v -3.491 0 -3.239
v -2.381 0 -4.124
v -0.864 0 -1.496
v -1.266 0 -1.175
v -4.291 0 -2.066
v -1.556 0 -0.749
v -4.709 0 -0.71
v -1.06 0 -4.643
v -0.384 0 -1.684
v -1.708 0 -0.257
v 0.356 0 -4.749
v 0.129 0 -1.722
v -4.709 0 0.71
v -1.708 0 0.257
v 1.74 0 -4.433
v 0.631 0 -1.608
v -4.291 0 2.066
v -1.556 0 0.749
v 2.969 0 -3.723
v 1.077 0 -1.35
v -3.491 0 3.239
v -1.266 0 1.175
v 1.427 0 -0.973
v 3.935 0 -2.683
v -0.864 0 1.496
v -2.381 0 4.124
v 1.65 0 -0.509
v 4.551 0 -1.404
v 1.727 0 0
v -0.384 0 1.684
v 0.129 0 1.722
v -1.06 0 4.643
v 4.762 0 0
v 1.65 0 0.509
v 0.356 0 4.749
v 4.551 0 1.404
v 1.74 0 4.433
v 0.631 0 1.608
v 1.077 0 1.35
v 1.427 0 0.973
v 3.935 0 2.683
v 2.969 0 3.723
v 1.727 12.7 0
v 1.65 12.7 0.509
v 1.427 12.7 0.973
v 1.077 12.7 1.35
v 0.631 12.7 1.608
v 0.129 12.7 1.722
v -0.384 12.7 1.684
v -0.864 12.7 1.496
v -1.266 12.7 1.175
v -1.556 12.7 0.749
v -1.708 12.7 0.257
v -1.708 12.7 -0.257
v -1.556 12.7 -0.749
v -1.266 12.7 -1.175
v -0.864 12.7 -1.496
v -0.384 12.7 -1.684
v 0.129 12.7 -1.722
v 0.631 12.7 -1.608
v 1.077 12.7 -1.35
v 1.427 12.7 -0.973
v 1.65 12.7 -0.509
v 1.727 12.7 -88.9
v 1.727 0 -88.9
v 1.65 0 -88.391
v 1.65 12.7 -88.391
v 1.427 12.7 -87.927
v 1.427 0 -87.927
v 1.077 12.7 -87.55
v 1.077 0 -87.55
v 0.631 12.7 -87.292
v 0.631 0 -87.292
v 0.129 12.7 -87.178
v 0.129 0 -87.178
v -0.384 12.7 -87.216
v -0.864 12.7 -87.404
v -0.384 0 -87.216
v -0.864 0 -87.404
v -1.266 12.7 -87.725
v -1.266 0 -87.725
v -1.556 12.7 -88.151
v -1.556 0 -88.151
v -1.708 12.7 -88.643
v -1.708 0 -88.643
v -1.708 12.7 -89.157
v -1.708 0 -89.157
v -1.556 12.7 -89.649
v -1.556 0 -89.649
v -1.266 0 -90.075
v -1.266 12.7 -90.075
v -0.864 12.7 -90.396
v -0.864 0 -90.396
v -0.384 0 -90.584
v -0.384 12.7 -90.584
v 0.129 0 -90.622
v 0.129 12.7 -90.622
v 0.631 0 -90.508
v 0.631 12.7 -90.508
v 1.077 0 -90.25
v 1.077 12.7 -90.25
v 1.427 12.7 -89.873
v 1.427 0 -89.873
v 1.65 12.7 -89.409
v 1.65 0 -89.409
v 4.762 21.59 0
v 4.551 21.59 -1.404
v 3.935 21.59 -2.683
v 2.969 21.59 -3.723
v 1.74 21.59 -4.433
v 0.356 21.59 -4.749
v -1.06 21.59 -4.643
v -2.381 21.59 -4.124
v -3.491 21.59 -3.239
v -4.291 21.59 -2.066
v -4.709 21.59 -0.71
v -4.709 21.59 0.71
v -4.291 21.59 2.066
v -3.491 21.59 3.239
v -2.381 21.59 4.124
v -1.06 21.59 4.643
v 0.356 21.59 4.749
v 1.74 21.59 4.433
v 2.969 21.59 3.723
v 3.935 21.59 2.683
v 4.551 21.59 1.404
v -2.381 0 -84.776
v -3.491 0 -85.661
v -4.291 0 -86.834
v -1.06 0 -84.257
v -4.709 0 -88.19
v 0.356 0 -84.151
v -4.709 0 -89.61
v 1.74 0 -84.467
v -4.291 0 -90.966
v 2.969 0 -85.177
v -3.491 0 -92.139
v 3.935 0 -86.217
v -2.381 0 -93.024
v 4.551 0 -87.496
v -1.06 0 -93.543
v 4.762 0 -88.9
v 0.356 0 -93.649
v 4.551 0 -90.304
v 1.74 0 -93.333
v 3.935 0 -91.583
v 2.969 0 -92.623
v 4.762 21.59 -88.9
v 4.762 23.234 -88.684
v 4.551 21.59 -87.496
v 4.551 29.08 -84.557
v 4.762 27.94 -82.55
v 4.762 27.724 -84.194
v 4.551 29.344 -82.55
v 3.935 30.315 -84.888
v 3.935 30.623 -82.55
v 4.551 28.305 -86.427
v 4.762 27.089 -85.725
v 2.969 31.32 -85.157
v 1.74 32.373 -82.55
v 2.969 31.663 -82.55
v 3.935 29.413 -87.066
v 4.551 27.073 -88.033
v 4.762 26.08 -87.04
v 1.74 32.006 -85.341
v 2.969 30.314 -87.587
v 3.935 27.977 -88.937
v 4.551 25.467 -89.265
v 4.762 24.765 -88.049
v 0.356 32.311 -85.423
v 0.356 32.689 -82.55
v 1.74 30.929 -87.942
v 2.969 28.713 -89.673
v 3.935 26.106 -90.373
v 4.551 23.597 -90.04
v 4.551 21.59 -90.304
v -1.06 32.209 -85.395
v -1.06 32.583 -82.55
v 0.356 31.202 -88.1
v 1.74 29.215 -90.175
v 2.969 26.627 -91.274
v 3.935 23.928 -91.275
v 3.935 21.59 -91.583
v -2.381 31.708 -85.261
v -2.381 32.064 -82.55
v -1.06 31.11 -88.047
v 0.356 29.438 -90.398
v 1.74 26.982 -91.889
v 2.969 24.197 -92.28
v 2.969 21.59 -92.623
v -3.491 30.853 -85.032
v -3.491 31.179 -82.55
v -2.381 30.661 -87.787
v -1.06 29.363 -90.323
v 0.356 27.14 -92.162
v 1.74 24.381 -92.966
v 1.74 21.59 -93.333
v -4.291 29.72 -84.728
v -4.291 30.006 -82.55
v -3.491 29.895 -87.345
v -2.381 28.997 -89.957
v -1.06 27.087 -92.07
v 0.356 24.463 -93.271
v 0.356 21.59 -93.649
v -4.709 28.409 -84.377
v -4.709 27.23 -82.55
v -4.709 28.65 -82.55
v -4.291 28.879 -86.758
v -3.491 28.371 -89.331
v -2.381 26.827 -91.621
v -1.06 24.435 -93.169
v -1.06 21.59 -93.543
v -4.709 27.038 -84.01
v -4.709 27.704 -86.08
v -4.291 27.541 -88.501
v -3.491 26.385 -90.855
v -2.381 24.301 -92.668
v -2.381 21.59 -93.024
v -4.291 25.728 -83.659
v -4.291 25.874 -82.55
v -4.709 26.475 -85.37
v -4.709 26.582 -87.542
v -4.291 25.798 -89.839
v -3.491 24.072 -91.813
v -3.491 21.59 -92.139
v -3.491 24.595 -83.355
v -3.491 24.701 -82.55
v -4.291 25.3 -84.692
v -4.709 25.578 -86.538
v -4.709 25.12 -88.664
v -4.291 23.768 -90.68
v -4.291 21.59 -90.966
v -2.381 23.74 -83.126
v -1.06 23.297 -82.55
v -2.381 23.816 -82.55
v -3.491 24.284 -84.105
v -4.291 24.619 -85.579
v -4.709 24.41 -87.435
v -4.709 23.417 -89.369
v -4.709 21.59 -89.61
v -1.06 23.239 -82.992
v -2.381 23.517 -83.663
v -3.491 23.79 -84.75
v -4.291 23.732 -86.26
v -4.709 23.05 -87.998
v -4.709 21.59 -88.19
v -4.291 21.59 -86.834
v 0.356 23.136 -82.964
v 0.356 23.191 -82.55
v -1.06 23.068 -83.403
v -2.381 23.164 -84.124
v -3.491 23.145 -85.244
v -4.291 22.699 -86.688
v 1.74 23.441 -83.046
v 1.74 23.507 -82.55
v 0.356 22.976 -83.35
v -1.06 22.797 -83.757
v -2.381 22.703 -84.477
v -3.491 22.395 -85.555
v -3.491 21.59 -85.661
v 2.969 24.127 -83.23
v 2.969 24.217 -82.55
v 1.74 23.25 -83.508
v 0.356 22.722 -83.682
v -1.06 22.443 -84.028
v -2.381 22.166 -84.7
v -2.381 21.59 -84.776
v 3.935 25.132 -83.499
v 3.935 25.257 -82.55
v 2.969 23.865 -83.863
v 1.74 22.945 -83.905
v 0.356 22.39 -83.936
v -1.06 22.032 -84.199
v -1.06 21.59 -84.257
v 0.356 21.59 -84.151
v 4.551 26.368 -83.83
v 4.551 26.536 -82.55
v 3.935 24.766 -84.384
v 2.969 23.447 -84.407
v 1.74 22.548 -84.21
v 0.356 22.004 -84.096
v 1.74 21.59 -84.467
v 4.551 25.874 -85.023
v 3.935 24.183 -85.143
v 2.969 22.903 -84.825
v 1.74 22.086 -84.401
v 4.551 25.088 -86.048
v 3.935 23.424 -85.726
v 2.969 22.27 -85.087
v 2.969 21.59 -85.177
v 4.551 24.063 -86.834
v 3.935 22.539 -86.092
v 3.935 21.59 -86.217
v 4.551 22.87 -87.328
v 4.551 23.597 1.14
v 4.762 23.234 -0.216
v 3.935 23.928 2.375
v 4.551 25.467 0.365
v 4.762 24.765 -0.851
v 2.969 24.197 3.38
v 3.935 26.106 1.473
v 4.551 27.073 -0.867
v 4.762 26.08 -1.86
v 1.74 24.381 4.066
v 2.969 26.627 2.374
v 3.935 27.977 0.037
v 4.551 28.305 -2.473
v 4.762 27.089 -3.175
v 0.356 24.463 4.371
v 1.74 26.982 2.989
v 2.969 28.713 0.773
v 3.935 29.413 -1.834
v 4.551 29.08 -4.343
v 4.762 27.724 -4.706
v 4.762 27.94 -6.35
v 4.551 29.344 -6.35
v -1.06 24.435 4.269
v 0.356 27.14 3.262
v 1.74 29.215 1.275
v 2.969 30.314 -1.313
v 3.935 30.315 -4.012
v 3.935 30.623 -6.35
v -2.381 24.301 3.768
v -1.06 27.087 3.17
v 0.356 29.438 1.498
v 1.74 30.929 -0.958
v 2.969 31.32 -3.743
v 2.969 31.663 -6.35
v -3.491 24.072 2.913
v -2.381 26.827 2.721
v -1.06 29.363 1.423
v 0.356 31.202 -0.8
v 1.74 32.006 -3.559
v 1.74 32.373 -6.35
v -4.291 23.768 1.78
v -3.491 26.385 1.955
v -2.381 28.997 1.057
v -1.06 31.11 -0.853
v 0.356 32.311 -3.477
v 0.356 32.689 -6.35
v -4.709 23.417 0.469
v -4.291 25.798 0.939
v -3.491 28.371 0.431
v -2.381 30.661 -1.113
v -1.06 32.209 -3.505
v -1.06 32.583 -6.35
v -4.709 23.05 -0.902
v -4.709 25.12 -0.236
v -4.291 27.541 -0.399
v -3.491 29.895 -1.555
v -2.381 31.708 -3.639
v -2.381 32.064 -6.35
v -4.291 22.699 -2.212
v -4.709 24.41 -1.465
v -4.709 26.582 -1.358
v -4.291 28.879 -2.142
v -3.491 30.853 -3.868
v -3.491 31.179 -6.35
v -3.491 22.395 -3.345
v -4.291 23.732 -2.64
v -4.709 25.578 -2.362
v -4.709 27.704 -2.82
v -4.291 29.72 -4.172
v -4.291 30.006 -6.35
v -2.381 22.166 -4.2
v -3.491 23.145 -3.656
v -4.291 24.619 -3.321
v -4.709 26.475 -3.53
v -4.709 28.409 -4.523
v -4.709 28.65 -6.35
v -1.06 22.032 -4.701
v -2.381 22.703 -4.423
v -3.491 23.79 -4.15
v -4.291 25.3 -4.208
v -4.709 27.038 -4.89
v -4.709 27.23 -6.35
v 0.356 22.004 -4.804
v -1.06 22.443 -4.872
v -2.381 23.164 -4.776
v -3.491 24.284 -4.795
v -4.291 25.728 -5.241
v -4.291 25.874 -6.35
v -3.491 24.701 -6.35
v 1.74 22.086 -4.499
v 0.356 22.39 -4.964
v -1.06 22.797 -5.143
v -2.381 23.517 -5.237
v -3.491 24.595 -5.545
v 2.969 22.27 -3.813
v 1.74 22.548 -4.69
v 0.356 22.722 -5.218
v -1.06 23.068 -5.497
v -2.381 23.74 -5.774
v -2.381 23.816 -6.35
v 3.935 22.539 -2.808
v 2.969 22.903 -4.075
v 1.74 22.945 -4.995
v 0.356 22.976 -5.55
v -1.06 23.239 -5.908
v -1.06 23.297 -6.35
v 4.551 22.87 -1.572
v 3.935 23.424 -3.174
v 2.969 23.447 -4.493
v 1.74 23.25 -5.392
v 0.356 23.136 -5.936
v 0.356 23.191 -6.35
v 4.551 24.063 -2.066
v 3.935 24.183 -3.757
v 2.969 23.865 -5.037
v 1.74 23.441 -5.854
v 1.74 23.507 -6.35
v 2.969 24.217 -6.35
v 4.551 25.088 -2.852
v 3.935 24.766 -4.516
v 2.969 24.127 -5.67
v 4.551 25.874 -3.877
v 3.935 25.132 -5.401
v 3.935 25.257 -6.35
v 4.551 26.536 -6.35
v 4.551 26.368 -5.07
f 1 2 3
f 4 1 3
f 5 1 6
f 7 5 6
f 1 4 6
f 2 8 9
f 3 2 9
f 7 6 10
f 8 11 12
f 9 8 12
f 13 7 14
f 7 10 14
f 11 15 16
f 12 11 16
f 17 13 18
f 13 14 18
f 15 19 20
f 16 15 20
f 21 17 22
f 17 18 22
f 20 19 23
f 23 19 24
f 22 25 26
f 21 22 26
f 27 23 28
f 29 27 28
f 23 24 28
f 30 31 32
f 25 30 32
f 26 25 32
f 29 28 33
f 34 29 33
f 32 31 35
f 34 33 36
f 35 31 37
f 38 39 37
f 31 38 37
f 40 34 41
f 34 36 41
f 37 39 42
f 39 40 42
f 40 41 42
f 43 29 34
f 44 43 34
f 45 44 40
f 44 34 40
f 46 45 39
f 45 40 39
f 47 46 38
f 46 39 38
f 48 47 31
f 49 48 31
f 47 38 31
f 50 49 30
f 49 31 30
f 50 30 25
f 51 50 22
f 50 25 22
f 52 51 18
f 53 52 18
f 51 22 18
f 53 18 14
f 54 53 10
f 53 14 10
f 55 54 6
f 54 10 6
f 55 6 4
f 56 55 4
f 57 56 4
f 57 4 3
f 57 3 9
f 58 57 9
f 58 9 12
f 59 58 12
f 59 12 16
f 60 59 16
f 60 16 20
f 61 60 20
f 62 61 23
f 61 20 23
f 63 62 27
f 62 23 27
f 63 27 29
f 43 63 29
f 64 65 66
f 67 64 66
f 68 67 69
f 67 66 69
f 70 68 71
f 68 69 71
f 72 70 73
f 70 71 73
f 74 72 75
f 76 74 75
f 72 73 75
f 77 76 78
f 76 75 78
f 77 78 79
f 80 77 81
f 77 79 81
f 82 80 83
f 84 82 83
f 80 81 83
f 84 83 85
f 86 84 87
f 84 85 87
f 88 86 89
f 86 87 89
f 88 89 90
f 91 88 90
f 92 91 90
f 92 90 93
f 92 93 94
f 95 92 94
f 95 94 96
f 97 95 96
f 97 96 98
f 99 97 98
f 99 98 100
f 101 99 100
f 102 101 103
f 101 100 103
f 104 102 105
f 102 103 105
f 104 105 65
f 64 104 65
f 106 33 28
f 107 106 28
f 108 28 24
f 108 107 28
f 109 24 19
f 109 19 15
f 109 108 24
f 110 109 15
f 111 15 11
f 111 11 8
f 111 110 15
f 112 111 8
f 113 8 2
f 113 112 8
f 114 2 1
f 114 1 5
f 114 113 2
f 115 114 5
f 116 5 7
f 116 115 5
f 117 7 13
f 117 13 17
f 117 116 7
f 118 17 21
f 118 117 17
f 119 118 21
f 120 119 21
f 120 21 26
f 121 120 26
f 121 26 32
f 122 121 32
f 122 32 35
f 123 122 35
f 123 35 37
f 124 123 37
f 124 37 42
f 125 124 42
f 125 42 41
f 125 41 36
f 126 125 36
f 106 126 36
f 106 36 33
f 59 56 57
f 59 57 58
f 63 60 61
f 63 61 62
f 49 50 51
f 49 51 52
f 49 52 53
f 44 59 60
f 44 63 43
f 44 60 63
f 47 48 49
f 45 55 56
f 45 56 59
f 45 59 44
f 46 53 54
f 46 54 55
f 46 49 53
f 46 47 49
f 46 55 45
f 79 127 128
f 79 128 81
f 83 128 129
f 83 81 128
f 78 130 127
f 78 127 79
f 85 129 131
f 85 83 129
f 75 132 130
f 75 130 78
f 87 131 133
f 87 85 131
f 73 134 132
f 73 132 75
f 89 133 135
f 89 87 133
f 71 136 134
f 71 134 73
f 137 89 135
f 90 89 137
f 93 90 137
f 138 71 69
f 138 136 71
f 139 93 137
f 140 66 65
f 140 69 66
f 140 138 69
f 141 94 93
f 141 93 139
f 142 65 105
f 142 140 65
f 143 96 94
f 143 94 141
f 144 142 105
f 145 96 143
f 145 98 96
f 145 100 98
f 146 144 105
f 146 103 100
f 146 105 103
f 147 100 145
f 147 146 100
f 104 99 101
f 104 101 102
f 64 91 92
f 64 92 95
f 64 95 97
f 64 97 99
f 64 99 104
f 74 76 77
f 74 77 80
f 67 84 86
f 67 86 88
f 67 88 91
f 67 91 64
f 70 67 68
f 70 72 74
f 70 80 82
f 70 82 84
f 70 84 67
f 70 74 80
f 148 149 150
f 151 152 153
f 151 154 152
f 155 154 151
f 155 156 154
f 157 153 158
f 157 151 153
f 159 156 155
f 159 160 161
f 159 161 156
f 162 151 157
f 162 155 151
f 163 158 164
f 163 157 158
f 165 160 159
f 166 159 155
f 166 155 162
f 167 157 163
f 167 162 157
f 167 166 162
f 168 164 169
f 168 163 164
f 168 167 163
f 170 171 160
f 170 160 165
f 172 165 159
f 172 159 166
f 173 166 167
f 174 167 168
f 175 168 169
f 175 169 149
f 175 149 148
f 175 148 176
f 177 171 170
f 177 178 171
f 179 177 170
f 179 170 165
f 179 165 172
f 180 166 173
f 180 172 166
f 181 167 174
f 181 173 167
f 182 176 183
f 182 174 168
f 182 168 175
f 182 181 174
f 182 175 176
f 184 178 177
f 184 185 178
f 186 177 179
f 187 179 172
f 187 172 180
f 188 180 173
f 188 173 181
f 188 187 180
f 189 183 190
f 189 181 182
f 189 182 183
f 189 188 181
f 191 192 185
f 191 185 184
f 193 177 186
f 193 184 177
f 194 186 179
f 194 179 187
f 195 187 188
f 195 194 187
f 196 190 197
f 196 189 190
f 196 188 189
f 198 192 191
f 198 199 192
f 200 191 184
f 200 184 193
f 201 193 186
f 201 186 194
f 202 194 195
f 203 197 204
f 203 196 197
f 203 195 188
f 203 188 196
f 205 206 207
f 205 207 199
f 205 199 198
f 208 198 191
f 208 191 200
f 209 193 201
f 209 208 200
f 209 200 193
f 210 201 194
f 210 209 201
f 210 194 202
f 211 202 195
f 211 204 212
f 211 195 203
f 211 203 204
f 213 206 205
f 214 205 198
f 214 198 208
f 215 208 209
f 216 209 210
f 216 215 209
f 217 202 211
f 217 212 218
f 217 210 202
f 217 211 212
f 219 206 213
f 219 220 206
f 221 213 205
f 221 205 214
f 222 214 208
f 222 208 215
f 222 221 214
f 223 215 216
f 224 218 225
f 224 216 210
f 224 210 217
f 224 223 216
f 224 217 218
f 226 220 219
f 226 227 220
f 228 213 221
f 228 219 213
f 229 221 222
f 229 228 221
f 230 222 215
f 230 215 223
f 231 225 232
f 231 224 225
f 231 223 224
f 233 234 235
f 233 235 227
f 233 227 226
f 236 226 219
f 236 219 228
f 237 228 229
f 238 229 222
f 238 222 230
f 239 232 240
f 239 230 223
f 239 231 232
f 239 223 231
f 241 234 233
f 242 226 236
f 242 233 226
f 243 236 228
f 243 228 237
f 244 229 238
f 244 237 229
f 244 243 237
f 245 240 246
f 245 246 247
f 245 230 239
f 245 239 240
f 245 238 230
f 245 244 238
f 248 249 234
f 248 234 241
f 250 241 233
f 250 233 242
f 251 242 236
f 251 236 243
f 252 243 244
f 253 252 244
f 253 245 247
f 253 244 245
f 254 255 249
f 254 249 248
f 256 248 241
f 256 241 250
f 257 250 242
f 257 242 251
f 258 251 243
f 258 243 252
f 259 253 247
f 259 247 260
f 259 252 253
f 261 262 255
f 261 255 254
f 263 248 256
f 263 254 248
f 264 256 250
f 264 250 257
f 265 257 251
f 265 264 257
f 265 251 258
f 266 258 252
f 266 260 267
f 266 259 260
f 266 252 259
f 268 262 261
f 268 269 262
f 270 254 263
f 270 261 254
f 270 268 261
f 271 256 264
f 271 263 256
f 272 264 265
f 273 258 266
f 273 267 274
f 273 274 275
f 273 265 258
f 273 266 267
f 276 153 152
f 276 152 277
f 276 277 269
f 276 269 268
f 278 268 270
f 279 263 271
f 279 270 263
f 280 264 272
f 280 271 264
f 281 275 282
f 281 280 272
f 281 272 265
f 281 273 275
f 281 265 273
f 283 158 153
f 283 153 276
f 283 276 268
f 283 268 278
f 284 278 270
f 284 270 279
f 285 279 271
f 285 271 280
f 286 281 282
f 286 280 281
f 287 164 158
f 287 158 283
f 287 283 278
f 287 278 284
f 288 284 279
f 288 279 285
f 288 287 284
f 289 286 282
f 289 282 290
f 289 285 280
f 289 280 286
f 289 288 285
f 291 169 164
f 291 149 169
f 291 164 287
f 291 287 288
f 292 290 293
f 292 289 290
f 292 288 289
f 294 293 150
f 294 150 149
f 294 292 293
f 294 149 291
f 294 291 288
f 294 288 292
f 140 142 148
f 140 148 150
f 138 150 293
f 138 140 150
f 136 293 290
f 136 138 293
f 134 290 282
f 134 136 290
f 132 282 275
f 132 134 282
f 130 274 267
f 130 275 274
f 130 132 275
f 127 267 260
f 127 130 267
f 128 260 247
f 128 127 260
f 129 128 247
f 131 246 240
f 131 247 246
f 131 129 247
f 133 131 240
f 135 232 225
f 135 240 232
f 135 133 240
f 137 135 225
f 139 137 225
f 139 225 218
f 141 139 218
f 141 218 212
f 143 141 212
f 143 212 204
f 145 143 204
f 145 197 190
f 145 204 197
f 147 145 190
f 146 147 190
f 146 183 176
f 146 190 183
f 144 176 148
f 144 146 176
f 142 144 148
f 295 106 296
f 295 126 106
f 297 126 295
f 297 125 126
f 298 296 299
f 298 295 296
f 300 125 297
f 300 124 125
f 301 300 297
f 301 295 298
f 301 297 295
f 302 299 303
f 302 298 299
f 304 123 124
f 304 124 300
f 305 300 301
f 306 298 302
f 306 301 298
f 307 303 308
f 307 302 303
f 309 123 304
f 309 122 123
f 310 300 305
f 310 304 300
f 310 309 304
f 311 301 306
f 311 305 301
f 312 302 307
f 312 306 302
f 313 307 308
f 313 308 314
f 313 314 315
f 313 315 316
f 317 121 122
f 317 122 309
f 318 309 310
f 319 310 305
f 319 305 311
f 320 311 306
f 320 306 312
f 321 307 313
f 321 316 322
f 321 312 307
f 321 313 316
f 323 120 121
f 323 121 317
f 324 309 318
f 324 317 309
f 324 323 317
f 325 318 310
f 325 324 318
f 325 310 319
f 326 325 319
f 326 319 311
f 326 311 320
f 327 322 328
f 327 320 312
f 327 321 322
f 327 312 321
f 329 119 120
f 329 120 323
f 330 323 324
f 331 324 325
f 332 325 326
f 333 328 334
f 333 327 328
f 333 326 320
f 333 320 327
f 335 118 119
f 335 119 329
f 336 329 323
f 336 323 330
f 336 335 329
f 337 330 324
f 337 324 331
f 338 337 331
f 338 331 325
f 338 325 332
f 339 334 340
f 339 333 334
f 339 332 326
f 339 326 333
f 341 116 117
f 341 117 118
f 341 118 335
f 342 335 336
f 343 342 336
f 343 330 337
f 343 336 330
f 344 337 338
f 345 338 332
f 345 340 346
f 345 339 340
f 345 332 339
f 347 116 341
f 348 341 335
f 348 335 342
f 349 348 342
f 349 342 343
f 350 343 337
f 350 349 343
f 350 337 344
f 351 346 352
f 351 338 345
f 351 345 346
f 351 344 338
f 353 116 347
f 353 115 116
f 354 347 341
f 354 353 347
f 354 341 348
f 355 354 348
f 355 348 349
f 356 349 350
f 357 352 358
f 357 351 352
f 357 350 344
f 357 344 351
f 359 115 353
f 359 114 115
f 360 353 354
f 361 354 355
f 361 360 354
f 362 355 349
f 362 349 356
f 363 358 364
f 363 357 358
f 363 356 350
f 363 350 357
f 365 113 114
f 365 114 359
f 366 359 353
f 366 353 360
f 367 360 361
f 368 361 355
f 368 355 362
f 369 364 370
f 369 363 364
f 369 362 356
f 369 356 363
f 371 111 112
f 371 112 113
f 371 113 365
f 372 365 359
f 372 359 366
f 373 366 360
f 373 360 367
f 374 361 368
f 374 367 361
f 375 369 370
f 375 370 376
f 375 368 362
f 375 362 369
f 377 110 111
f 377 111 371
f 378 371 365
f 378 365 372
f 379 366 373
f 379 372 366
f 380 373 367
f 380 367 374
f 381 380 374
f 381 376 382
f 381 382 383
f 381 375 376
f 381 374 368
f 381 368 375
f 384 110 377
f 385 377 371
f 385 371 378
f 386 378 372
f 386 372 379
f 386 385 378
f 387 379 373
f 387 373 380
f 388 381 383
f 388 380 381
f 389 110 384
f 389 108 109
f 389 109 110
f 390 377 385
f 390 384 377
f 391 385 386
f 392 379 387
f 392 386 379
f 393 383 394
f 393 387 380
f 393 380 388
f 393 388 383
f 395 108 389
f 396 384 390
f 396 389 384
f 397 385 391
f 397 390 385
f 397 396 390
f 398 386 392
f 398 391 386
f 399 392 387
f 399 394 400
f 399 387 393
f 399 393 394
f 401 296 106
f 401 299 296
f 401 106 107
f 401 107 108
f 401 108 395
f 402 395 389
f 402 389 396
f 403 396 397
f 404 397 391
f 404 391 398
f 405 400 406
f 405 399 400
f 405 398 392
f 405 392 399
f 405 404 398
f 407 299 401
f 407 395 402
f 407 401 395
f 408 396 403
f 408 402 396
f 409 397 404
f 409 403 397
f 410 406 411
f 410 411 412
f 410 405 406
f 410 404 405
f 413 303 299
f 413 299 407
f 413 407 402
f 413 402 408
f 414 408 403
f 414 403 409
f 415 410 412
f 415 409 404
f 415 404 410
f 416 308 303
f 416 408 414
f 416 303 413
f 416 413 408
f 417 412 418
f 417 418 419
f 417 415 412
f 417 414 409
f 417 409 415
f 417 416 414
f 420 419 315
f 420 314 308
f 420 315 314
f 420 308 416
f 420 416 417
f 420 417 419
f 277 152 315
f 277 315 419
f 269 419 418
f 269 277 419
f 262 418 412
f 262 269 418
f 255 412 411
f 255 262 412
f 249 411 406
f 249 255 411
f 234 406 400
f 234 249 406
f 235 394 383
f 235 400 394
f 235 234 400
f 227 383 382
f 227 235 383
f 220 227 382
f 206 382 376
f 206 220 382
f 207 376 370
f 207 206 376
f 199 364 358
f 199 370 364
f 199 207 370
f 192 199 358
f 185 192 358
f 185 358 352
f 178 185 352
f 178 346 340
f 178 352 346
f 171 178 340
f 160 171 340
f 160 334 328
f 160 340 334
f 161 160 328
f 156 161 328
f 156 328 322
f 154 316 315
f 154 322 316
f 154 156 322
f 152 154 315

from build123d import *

# Parameters (mm, degrees)
SKETCH2_R          = 4.7625
SKETCH3_R          = 1.7272
CUT_EXTRUDE1_DEPTH = 12.7


with BuildPart() as part:
    # Base-Sweep: sweep along a path in Sketch1
    with BuildLine(Plane(origin=(0, 0, 0), x_dir=(0, 0, -1), z_dir=(1, 0, 0))) as base_sweep_path:
        Line((0, 0), (0, 21.59))
        ThreePointArc((0, 21.59), (1.859871939, 26.080128061), (6.35, 27.94))
        Line((6.35, 27.94), (82.55, 27.94))
        ThreePointArc((82.55, 27.94), (87.040128061, 26.080128061), (88.9, 21.59))
        Line((88.9, 21.59), (88.9, 0))
    # Sketch2 → Base-Sweep (sweep)
    with BuildSketch(Plane(origin=(0, 0, 0), x_dir=(1, 0, 0), z_dir=(0, 1, 0))):
        Circle(SKETCH2_R)
    sweep(path=base_sweep_path.line)

    # Sketch3 → Cut-Extrude1 (cut)
    with BuildSketch(Plane.XZ):
        Circle(SKETCH3_R)
        with Locations((0, -88.9)):
            Circle(SKETCH3_R)
    extrude(amount=-CUT_EXTRUDE1_DEPTH, mode=Mode.SUBTRACT)


solid = part.part
